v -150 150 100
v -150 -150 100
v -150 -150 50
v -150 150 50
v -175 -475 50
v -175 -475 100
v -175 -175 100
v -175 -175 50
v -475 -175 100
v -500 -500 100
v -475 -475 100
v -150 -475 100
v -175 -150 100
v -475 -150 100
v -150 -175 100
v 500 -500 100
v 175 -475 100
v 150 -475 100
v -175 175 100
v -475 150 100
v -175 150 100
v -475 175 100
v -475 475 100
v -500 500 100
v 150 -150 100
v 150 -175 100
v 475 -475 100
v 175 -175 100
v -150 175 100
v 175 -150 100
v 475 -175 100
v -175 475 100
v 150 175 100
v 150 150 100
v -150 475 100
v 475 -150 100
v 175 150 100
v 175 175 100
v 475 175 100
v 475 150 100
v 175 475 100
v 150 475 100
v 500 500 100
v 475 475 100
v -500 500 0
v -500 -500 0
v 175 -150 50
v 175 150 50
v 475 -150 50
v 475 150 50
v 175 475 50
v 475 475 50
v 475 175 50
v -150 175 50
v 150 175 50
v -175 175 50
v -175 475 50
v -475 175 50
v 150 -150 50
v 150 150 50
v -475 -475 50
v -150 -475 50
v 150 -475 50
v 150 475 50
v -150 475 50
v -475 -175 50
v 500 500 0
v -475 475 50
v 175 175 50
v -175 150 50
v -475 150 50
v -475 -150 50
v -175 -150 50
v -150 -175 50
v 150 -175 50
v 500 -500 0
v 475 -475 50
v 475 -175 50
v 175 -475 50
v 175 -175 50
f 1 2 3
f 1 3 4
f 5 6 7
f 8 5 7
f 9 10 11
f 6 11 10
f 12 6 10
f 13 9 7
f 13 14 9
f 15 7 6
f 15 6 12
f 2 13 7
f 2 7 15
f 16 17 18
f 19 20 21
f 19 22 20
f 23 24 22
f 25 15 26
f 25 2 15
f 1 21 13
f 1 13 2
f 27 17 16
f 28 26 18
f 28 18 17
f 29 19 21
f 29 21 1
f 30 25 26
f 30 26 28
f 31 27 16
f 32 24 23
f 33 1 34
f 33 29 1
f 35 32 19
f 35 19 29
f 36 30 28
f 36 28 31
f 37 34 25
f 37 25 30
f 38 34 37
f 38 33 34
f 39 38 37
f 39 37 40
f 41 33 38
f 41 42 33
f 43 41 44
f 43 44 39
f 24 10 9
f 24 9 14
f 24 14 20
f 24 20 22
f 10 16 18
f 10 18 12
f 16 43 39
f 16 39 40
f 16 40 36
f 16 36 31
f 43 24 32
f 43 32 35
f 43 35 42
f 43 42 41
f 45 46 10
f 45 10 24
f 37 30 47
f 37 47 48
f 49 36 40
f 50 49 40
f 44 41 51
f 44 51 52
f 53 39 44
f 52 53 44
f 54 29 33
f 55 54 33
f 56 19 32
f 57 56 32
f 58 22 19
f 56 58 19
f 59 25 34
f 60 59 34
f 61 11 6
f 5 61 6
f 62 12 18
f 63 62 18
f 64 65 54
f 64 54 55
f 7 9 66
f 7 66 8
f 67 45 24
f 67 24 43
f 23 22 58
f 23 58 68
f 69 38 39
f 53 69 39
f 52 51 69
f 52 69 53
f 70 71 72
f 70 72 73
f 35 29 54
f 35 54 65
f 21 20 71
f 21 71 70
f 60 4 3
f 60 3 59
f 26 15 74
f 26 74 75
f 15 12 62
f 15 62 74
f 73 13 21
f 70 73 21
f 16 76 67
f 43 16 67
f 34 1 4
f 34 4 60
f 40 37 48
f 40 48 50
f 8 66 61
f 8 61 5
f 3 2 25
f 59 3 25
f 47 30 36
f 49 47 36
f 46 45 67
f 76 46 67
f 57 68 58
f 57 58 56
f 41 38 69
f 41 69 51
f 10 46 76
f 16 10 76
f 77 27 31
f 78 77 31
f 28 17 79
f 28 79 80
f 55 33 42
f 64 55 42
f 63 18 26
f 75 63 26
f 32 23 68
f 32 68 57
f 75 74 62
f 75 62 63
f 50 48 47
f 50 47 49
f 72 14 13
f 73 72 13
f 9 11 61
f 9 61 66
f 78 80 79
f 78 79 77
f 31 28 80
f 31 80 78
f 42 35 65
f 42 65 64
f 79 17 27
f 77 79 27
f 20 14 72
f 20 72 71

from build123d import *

# Parameters (mm, degrees)
F0_W     = 1000
F0_H     = 1000
F1_DEPTH = 100
F2_W     = 300
F2_H     = 300
F3_DEPTH = 50


with BuildPart() as f1:
    # F0 (on Top) → F1 (new body)
    with BuildSketch(Plane.XY):
        Rectangle(F0_W, F0_H)
    extrude(amount=F1_DEPTH)

    # F2 (on face) → F3 (cut)
    with BuildSketch(Plane.XY.offset(100)):
        with Locations((-325, 325)):
            Rectangle(F2_W, F2_H)
        with Locations((0, 325)):
            Rectangle(F2_W, F2_H)
        with Locations((325, 325)):
            Rectangle(F2_W, F2_H)
        with Locations((325, 0)):
            Rectangle(F2_W, F2_H)
        Rectangle(F2_W, F2_H)
        with Locations((-325, 0)):
            Rectangle(F2_W, F2_H)
        with Locations((-325, -325)):
            Rectangle(F2_W, F2_H)
        with Locations((0, -325)):
            Rectangle(F2_W, F2_H)
        with Locations((325, -325)):
            Rectangle(F2_W, F2_H)
    extrude(amount=-F3_DEPTH, mode=Mode.SUBTRACT)


solid = f1.part
